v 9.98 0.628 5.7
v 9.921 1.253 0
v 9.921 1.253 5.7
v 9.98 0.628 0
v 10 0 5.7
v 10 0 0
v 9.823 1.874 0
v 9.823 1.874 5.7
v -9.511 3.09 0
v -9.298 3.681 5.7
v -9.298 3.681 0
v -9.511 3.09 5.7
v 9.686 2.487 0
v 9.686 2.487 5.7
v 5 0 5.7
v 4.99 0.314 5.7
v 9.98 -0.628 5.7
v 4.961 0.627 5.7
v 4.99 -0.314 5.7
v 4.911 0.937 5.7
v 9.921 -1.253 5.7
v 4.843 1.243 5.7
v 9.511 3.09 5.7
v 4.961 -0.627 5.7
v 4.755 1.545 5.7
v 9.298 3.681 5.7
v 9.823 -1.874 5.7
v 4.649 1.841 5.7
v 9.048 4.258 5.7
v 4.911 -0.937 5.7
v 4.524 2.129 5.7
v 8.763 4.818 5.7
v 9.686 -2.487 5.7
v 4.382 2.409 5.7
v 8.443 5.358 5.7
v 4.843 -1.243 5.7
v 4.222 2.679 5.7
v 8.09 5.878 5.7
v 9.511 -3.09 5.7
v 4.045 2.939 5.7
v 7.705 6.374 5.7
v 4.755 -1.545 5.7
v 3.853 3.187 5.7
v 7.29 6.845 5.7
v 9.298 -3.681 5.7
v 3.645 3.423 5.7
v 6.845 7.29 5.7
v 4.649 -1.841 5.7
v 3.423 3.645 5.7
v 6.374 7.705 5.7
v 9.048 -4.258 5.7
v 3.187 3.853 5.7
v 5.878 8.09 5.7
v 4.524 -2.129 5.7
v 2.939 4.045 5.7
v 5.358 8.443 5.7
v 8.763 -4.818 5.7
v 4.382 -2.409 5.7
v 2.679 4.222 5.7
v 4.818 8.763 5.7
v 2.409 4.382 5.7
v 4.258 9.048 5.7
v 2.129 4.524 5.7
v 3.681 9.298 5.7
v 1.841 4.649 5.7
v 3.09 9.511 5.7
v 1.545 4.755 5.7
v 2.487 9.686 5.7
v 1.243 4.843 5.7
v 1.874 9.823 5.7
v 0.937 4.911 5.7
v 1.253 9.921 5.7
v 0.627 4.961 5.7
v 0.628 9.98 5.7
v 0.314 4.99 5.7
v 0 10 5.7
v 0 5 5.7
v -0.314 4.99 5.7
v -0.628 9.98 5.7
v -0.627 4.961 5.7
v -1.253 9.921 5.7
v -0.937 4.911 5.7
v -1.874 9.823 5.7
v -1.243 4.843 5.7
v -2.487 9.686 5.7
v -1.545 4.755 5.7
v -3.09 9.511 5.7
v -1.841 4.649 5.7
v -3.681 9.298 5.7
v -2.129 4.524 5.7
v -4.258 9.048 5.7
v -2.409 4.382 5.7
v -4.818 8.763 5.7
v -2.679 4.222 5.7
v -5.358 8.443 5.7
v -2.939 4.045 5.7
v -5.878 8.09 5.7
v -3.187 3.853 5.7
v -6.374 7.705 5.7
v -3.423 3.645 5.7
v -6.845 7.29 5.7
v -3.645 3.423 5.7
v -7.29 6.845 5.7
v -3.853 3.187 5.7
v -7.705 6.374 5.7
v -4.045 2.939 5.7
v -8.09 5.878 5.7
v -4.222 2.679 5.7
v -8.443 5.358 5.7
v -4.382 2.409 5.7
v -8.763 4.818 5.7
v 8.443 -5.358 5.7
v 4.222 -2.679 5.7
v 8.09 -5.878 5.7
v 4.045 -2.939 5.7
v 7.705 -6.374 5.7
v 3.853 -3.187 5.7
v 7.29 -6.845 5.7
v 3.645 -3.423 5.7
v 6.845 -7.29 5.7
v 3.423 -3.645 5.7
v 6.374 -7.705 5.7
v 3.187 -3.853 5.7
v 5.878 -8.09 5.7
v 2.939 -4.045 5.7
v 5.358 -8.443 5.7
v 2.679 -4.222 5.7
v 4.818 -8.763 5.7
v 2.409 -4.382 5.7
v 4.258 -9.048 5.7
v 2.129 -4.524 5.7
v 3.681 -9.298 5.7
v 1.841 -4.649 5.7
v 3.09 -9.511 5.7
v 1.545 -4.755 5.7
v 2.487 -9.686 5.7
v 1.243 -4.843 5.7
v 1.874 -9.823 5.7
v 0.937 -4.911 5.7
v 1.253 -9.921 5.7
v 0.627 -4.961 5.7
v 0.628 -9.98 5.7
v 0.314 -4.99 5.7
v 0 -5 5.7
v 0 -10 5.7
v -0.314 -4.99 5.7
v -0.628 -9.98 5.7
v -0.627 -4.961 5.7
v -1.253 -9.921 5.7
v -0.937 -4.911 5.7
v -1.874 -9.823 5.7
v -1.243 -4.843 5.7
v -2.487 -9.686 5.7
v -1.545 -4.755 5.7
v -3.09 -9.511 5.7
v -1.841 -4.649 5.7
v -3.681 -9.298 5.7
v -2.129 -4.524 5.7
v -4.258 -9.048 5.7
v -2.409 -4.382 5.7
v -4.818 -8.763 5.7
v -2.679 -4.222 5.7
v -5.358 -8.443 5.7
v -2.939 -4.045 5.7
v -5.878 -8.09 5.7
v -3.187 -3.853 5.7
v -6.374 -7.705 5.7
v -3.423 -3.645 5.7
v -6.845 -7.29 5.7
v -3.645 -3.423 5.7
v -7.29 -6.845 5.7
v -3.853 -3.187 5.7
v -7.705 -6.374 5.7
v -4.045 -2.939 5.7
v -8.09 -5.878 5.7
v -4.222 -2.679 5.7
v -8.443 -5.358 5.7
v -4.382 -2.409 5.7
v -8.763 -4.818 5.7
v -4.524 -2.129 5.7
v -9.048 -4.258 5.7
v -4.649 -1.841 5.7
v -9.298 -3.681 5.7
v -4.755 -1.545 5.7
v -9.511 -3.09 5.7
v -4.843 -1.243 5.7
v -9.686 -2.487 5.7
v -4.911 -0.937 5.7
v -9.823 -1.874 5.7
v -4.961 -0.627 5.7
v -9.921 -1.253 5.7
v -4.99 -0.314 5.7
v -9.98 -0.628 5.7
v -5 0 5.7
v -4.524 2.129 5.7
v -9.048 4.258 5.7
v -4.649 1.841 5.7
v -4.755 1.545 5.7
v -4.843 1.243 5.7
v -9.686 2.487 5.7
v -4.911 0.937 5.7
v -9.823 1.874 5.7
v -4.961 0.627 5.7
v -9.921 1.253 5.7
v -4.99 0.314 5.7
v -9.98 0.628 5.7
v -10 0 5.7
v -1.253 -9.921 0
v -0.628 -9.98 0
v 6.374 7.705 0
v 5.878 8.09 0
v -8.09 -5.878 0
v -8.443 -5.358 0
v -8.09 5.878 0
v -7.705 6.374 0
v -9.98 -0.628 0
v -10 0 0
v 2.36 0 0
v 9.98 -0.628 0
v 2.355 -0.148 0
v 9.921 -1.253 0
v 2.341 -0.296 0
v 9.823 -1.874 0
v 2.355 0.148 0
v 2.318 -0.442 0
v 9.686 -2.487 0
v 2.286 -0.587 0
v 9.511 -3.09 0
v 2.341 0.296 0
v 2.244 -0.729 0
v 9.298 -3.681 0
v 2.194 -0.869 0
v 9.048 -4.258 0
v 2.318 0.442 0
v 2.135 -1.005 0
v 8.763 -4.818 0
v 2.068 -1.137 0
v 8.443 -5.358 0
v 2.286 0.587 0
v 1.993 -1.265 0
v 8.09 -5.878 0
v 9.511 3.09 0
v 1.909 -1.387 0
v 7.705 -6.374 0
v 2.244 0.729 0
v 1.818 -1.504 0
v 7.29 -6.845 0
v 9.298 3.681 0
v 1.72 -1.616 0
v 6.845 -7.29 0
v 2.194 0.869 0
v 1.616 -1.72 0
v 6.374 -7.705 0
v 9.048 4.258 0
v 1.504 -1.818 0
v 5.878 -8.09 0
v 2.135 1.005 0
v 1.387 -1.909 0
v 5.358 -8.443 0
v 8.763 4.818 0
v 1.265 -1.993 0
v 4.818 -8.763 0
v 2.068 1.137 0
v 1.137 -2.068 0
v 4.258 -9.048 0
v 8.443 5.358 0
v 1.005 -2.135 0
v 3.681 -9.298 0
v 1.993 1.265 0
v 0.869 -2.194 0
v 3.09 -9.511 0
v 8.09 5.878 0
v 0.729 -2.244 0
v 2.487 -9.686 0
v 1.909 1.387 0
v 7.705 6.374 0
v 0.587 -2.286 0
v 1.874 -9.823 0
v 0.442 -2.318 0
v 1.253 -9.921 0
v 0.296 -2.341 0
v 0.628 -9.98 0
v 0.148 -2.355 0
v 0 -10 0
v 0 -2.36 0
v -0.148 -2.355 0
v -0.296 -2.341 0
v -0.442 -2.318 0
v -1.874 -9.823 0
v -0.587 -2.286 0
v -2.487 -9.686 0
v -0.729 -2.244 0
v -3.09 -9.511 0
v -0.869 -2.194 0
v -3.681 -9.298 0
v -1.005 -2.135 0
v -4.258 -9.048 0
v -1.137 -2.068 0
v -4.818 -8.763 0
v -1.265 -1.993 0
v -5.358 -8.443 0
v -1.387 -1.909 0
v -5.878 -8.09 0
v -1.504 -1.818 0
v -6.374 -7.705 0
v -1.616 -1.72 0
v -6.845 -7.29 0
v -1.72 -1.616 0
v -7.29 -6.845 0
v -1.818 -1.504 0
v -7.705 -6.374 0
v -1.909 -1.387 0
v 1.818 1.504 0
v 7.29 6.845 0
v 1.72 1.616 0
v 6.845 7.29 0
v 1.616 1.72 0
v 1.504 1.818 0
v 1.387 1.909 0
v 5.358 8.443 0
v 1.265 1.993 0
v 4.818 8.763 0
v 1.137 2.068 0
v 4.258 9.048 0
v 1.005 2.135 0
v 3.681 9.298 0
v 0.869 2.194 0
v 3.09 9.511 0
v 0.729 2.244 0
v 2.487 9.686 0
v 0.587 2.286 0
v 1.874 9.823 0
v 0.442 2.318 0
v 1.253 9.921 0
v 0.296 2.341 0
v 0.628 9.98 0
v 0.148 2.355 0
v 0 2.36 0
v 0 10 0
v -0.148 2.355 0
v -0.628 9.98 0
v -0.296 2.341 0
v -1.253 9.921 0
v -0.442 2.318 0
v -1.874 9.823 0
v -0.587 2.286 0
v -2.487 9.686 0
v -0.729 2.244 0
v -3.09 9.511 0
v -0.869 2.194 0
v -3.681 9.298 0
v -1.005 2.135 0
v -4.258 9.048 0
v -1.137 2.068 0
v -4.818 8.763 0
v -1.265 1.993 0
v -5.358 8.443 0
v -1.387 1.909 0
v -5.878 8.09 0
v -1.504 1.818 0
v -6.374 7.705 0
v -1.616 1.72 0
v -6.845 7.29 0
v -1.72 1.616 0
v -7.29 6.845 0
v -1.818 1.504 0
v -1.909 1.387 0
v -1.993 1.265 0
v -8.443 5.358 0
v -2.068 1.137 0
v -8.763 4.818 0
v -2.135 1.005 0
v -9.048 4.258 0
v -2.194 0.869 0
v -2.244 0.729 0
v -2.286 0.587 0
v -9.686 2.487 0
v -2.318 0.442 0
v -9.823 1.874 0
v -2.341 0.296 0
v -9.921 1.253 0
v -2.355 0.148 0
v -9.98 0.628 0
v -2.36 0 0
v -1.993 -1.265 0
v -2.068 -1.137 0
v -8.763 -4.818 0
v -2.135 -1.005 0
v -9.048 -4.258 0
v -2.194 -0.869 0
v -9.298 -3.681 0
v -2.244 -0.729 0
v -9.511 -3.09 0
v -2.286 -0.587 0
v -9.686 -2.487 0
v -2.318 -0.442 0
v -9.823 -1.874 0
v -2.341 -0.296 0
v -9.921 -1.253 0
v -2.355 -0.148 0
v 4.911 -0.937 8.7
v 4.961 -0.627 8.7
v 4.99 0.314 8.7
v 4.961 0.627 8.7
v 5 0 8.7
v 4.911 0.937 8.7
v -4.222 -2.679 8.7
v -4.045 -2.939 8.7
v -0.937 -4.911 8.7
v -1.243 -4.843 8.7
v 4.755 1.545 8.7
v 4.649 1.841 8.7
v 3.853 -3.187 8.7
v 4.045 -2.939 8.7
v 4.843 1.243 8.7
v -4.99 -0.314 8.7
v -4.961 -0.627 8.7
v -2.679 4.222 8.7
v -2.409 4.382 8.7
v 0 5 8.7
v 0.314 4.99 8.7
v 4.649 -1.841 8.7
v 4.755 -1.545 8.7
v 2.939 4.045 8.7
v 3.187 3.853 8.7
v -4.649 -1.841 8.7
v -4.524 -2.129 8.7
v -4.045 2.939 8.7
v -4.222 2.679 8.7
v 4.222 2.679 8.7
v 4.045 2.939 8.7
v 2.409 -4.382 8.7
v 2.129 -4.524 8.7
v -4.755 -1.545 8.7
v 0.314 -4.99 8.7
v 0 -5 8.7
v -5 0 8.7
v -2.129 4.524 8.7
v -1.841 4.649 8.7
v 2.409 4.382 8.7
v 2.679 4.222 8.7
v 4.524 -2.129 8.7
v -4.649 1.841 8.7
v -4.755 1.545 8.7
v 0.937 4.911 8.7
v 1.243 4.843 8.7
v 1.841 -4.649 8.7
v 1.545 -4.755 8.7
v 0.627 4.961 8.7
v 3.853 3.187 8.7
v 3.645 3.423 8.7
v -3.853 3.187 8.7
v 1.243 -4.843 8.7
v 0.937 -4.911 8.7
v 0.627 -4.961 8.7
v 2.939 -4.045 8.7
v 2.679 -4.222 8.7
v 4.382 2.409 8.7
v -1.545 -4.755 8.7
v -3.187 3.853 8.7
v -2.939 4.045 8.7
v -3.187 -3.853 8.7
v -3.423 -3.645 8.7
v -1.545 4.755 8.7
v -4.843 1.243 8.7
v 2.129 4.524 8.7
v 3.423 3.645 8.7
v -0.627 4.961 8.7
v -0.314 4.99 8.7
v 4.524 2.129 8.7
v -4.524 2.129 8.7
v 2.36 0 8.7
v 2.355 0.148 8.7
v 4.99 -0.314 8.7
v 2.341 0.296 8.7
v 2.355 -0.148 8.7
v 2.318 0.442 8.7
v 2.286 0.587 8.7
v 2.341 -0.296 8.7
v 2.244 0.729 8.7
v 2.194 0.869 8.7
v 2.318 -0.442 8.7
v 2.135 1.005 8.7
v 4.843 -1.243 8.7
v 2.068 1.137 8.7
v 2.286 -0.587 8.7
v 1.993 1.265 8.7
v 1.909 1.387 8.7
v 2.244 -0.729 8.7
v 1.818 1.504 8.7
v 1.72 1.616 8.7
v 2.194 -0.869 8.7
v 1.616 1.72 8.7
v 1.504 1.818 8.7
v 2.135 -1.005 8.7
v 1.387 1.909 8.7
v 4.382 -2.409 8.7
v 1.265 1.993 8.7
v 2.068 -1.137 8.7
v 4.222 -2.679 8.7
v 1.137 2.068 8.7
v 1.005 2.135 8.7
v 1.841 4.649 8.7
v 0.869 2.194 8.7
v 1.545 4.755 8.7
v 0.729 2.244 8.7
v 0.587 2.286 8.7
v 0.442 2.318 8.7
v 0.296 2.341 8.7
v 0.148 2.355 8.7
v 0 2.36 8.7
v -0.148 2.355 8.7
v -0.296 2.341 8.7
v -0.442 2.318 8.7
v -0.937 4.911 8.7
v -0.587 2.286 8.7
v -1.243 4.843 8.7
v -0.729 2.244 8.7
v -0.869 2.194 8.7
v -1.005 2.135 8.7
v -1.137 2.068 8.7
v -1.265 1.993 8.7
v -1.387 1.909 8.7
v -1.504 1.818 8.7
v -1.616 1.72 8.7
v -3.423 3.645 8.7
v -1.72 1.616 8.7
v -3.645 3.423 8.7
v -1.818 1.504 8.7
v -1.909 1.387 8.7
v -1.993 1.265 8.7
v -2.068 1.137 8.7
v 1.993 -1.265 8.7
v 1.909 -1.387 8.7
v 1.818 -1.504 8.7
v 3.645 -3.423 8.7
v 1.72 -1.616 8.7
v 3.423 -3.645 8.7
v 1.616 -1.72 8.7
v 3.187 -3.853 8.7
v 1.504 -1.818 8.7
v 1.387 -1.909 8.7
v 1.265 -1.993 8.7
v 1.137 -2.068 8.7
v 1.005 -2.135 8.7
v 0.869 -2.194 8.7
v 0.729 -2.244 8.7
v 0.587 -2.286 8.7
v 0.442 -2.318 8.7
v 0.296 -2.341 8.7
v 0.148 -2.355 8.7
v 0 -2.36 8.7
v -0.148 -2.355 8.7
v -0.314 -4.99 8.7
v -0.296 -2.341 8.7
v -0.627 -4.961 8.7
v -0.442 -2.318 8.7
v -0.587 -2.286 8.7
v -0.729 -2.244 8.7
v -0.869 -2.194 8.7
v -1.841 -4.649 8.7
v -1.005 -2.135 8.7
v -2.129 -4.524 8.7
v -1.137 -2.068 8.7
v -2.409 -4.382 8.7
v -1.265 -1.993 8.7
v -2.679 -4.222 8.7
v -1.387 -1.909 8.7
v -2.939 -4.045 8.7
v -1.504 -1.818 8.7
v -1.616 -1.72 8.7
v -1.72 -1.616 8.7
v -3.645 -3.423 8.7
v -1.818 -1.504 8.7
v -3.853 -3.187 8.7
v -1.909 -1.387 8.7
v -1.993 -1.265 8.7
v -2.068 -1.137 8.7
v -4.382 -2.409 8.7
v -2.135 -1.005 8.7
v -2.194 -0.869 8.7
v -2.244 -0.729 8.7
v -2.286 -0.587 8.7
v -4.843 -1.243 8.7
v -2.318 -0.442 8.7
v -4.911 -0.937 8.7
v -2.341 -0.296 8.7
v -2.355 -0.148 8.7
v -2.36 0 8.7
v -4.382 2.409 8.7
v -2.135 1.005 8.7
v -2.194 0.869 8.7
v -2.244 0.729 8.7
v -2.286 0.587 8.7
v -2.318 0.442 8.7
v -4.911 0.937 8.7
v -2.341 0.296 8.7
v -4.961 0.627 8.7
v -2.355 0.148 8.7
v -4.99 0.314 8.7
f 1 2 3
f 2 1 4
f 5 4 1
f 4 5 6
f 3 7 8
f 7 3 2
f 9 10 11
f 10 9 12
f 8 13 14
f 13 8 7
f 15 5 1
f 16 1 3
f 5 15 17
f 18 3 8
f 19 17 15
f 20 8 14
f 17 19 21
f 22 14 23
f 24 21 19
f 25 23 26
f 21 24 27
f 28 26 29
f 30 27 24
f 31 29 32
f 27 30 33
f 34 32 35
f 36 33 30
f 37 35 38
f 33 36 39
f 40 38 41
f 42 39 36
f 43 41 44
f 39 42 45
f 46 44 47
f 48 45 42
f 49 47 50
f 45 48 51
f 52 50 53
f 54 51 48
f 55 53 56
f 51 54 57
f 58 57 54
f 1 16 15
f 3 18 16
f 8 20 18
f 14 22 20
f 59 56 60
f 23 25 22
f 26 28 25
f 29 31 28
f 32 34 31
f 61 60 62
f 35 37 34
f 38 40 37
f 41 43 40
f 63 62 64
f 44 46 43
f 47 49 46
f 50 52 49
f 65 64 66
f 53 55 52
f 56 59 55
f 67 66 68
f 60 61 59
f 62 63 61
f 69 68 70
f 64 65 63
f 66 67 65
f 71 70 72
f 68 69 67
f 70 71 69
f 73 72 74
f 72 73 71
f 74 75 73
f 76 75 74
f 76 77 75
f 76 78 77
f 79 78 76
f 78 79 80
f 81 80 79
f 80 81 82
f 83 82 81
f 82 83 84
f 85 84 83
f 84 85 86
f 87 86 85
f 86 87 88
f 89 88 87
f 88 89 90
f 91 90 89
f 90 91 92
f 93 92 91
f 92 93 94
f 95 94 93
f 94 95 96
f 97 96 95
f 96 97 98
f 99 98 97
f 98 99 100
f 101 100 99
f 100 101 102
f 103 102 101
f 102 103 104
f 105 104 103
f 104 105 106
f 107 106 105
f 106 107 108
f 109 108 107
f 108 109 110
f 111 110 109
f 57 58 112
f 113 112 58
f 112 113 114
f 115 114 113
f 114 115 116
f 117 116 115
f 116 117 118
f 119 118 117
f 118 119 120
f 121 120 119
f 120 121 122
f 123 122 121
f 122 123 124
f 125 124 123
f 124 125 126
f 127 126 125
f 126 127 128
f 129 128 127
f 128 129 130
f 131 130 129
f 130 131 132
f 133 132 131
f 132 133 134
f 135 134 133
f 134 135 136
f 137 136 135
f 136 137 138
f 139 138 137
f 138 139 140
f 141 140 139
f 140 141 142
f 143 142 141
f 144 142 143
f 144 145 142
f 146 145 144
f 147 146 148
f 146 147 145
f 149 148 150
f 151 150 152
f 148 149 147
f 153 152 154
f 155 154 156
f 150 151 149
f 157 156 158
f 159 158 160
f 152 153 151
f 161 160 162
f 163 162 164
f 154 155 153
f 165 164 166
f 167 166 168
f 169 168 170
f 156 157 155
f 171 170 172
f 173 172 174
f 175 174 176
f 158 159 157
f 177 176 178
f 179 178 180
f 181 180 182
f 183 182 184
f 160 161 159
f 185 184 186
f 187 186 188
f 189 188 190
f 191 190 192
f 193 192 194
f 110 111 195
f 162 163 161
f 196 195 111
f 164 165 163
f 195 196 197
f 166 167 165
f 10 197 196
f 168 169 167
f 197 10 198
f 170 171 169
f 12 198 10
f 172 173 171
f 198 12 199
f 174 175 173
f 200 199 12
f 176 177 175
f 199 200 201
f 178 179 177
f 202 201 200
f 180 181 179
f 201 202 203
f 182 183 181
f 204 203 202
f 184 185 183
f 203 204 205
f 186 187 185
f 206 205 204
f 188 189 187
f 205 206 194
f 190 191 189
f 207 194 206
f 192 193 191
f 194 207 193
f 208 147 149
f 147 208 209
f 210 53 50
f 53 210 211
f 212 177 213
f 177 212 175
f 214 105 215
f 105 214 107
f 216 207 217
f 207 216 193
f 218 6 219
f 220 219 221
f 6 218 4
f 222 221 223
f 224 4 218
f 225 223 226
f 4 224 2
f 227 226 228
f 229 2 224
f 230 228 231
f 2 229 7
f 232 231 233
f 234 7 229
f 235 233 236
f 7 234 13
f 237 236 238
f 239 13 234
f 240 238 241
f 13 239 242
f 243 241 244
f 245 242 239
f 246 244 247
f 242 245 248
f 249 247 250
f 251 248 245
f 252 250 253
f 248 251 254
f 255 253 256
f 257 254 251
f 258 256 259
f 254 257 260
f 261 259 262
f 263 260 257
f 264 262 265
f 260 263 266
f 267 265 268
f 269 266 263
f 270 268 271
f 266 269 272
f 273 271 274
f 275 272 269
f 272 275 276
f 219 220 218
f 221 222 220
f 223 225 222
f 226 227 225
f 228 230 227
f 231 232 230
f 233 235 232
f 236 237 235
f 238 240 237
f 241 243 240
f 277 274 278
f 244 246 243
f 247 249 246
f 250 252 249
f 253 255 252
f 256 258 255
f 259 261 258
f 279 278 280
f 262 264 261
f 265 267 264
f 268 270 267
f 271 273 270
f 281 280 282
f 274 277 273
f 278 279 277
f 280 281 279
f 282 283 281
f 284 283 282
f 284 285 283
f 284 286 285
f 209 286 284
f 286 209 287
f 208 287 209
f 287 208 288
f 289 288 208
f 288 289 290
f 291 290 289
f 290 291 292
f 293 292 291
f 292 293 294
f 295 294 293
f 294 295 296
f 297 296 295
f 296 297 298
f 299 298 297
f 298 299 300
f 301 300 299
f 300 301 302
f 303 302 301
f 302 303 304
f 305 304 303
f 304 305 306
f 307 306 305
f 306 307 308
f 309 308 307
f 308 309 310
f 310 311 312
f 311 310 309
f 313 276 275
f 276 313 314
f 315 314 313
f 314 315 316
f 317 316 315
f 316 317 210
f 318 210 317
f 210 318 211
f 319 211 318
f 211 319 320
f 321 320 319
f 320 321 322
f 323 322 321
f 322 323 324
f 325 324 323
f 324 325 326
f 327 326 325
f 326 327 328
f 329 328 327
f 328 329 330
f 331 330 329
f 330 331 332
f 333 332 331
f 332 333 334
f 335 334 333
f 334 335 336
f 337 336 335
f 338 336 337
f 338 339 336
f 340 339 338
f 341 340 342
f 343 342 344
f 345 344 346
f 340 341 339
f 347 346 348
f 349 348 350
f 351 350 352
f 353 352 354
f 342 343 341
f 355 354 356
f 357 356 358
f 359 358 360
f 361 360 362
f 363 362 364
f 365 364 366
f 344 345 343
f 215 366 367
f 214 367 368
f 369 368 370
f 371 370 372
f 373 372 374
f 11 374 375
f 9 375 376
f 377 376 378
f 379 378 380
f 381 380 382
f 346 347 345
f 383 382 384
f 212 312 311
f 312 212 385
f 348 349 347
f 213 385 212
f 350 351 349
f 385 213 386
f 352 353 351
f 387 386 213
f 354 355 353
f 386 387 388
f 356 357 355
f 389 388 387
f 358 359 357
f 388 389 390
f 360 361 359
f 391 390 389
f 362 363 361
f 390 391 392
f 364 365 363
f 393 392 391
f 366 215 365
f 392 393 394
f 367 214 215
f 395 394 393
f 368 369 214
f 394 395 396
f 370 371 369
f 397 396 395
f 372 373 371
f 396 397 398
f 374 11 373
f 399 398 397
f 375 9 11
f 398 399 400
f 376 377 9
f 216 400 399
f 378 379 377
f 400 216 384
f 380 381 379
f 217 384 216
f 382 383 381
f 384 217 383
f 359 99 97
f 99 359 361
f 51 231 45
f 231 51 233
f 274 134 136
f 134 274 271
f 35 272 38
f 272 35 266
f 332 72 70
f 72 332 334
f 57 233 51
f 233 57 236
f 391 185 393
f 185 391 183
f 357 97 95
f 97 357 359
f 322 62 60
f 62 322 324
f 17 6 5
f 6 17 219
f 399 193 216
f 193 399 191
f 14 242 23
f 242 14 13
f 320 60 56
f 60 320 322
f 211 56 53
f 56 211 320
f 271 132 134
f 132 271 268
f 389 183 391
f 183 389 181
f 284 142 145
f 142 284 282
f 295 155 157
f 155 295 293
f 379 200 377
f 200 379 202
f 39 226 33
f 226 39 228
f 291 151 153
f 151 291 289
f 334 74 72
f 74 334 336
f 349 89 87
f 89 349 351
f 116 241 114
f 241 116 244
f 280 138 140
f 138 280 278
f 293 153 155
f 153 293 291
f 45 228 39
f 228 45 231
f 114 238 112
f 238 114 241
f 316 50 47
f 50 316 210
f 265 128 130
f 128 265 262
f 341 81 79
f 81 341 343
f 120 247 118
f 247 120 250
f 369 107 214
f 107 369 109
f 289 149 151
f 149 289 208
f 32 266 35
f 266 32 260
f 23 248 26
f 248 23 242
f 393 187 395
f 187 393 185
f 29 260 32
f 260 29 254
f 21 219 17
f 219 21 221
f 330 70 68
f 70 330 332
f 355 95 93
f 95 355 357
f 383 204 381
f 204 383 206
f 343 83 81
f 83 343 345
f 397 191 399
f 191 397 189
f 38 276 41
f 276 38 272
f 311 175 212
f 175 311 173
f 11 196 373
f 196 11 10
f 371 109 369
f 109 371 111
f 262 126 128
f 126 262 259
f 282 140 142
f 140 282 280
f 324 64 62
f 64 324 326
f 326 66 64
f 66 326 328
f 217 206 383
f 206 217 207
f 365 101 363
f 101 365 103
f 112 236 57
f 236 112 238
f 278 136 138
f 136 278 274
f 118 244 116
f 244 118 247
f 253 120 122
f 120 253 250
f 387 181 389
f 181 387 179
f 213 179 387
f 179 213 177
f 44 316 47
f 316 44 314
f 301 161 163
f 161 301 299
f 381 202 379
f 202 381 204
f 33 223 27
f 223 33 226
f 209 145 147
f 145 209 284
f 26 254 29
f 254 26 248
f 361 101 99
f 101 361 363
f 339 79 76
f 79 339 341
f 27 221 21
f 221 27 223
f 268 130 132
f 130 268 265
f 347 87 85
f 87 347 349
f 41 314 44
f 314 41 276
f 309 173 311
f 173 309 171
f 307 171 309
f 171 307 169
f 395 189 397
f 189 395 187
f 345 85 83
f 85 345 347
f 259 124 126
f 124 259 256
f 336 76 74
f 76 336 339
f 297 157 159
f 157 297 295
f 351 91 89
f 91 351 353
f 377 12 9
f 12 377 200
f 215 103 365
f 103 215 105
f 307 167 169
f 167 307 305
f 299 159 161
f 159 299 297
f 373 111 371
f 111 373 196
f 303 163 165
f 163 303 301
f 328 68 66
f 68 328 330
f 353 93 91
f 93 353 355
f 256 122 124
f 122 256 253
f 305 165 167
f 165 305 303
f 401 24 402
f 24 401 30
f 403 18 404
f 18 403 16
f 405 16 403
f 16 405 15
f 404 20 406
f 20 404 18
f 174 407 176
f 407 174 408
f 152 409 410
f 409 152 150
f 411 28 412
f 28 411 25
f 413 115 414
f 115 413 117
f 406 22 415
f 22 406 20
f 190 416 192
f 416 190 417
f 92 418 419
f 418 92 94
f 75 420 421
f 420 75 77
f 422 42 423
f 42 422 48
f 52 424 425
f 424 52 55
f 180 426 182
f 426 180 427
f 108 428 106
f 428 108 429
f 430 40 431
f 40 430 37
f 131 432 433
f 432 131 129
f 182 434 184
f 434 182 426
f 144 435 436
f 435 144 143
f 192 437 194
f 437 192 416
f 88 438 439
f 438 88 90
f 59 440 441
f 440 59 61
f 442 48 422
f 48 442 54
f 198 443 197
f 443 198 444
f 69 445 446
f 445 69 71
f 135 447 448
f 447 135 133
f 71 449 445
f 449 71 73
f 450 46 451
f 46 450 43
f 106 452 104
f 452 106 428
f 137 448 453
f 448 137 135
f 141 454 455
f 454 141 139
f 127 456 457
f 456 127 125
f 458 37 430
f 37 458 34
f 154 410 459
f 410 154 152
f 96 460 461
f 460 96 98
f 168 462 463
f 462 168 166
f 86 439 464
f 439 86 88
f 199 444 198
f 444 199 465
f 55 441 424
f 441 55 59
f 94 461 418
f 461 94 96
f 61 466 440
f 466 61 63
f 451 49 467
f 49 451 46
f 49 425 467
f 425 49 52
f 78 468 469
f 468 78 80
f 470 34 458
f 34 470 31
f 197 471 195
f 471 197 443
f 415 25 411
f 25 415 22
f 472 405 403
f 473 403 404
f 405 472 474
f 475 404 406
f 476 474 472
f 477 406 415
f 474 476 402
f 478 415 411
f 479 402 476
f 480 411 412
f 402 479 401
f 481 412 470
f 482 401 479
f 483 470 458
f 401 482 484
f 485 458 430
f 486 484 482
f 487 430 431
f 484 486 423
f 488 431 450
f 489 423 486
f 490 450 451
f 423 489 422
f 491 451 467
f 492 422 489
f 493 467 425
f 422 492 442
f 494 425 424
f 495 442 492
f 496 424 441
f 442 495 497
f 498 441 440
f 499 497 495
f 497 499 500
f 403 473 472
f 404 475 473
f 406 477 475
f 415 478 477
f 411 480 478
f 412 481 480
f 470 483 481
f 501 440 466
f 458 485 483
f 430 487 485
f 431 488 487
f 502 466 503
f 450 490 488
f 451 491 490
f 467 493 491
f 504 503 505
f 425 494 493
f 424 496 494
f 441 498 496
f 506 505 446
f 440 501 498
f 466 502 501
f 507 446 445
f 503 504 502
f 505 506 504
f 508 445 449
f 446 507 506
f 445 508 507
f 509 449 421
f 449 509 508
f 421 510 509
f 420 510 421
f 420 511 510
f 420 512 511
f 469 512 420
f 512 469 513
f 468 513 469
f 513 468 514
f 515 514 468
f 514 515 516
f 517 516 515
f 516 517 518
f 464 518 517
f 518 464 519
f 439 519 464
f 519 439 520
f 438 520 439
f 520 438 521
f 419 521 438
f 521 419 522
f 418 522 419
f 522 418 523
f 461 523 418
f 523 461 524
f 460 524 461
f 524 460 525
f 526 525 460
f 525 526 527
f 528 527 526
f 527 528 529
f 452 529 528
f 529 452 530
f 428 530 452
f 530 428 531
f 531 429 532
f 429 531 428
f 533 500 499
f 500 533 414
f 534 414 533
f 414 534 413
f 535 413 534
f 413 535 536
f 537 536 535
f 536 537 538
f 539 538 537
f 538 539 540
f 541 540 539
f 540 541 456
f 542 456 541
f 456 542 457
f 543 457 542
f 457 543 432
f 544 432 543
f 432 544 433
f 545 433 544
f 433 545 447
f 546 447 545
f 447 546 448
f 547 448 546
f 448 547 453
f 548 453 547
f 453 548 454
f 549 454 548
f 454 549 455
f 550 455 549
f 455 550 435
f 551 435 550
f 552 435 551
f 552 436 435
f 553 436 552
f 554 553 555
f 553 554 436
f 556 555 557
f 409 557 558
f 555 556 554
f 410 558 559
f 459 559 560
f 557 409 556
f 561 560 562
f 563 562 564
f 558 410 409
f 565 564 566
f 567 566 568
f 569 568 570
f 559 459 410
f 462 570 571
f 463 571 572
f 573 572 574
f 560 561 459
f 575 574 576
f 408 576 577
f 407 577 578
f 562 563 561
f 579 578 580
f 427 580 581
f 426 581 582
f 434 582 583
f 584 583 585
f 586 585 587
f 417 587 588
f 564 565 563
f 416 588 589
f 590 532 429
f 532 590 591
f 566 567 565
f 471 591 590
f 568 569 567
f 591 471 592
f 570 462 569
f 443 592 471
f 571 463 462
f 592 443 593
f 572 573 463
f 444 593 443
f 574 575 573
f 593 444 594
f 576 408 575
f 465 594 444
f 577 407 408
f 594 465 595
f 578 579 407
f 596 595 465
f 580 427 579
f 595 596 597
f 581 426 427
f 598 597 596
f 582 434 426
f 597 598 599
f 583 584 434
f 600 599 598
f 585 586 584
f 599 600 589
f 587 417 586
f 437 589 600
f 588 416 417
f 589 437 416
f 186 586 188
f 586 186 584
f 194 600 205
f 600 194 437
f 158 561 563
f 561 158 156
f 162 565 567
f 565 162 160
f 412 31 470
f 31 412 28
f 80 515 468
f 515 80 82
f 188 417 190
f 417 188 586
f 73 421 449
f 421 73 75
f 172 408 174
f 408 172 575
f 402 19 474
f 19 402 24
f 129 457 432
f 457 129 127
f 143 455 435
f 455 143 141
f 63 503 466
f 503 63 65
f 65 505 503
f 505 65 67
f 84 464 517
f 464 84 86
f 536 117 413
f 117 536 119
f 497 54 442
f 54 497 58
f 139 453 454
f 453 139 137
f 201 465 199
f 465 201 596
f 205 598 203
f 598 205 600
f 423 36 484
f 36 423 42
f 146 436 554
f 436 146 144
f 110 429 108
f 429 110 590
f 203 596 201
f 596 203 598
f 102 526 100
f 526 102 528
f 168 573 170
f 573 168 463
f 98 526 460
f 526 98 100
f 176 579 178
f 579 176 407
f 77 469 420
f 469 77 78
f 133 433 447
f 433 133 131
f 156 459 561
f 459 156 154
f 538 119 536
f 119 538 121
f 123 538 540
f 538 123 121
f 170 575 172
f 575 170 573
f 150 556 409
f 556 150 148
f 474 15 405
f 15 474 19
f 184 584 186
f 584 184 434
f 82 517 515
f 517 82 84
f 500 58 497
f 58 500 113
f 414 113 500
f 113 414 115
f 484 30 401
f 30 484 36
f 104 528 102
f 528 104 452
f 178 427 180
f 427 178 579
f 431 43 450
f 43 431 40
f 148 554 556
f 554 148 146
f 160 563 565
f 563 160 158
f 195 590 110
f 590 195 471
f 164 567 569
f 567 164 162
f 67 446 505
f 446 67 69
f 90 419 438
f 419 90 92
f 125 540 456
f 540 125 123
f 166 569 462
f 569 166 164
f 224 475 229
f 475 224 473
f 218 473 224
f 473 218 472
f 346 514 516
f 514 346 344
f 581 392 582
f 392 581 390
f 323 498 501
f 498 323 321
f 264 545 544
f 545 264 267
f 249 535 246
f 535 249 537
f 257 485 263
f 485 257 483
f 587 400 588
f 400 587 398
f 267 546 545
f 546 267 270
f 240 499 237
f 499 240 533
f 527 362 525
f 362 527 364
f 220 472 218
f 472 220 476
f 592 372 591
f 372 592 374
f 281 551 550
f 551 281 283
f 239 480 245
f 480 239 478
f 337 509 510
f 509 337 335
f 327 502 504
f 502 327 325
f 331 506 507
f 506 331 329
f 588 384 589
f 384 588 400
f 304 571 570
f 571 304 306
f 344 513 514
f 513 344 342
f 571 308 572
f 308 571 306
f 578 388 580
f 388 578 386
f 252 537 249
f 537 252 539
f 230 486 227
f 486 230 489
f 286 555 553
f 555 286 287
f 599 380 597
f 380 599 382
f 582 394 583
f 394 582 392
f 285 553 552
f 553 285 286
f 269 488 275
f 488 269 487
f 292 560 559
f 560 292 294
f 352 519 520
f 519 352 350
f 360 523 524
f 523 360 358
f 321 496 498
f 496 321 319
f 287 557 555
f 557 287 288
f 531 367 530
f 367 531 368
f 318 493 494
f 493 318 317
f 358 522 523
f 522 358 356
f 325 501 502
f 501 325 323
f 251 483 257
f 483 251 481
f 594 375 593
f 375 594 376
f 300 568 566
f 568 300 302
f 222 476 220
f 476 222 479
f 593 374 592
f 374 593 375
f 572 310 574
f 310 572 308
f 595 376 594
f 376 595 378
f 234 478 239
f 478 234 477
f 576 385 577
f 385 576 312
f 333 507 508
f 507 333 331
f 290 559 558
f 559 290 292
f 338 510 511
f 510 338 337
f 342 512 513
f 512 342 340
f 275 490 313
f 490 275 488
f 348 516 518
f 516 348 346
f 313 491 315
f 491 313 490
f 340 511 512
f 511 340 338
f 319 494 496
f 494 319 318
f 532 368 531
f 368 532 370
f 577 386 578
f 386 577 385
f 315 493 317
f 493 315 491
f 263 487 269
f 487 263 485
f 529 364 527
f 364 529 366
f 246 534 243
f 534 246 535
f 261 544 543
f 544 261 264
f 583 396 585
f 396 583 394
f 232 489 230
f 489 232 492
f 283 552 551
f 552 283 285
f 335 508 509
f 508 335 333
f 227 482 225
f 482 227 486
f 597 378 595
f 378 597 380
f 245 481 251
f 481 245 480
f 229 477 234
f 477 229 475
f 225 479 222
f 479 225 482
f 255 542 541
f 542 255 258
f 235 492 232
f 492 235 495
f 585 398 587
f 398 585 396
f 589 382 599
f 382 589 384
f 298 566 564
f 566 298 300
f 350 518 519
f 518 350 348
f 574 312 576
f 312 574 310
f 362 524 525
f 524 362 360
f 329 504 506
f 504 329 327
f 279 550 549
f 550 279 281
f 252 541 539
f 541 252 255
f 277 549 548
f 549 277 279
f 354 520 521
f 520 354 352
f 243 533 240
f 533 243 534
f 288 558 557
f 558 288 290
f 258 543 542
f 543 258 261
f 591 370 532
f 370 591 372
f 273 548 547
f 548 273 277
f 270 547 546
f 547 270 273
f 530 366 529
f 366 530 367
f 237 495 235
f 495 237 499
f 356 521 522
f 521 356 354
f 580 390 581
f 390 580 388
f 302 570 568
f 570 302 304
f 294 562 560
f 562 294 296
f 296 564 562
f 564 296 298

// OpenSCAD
$fn = 100;

difference() {
  union() {
    cylinder(r = 10, h = 5.7);
    cylinder(r = 5, h = 8.7);
  }

  translate([0,0, -5]) cylinder(r = 2.36, h = 20);
}
